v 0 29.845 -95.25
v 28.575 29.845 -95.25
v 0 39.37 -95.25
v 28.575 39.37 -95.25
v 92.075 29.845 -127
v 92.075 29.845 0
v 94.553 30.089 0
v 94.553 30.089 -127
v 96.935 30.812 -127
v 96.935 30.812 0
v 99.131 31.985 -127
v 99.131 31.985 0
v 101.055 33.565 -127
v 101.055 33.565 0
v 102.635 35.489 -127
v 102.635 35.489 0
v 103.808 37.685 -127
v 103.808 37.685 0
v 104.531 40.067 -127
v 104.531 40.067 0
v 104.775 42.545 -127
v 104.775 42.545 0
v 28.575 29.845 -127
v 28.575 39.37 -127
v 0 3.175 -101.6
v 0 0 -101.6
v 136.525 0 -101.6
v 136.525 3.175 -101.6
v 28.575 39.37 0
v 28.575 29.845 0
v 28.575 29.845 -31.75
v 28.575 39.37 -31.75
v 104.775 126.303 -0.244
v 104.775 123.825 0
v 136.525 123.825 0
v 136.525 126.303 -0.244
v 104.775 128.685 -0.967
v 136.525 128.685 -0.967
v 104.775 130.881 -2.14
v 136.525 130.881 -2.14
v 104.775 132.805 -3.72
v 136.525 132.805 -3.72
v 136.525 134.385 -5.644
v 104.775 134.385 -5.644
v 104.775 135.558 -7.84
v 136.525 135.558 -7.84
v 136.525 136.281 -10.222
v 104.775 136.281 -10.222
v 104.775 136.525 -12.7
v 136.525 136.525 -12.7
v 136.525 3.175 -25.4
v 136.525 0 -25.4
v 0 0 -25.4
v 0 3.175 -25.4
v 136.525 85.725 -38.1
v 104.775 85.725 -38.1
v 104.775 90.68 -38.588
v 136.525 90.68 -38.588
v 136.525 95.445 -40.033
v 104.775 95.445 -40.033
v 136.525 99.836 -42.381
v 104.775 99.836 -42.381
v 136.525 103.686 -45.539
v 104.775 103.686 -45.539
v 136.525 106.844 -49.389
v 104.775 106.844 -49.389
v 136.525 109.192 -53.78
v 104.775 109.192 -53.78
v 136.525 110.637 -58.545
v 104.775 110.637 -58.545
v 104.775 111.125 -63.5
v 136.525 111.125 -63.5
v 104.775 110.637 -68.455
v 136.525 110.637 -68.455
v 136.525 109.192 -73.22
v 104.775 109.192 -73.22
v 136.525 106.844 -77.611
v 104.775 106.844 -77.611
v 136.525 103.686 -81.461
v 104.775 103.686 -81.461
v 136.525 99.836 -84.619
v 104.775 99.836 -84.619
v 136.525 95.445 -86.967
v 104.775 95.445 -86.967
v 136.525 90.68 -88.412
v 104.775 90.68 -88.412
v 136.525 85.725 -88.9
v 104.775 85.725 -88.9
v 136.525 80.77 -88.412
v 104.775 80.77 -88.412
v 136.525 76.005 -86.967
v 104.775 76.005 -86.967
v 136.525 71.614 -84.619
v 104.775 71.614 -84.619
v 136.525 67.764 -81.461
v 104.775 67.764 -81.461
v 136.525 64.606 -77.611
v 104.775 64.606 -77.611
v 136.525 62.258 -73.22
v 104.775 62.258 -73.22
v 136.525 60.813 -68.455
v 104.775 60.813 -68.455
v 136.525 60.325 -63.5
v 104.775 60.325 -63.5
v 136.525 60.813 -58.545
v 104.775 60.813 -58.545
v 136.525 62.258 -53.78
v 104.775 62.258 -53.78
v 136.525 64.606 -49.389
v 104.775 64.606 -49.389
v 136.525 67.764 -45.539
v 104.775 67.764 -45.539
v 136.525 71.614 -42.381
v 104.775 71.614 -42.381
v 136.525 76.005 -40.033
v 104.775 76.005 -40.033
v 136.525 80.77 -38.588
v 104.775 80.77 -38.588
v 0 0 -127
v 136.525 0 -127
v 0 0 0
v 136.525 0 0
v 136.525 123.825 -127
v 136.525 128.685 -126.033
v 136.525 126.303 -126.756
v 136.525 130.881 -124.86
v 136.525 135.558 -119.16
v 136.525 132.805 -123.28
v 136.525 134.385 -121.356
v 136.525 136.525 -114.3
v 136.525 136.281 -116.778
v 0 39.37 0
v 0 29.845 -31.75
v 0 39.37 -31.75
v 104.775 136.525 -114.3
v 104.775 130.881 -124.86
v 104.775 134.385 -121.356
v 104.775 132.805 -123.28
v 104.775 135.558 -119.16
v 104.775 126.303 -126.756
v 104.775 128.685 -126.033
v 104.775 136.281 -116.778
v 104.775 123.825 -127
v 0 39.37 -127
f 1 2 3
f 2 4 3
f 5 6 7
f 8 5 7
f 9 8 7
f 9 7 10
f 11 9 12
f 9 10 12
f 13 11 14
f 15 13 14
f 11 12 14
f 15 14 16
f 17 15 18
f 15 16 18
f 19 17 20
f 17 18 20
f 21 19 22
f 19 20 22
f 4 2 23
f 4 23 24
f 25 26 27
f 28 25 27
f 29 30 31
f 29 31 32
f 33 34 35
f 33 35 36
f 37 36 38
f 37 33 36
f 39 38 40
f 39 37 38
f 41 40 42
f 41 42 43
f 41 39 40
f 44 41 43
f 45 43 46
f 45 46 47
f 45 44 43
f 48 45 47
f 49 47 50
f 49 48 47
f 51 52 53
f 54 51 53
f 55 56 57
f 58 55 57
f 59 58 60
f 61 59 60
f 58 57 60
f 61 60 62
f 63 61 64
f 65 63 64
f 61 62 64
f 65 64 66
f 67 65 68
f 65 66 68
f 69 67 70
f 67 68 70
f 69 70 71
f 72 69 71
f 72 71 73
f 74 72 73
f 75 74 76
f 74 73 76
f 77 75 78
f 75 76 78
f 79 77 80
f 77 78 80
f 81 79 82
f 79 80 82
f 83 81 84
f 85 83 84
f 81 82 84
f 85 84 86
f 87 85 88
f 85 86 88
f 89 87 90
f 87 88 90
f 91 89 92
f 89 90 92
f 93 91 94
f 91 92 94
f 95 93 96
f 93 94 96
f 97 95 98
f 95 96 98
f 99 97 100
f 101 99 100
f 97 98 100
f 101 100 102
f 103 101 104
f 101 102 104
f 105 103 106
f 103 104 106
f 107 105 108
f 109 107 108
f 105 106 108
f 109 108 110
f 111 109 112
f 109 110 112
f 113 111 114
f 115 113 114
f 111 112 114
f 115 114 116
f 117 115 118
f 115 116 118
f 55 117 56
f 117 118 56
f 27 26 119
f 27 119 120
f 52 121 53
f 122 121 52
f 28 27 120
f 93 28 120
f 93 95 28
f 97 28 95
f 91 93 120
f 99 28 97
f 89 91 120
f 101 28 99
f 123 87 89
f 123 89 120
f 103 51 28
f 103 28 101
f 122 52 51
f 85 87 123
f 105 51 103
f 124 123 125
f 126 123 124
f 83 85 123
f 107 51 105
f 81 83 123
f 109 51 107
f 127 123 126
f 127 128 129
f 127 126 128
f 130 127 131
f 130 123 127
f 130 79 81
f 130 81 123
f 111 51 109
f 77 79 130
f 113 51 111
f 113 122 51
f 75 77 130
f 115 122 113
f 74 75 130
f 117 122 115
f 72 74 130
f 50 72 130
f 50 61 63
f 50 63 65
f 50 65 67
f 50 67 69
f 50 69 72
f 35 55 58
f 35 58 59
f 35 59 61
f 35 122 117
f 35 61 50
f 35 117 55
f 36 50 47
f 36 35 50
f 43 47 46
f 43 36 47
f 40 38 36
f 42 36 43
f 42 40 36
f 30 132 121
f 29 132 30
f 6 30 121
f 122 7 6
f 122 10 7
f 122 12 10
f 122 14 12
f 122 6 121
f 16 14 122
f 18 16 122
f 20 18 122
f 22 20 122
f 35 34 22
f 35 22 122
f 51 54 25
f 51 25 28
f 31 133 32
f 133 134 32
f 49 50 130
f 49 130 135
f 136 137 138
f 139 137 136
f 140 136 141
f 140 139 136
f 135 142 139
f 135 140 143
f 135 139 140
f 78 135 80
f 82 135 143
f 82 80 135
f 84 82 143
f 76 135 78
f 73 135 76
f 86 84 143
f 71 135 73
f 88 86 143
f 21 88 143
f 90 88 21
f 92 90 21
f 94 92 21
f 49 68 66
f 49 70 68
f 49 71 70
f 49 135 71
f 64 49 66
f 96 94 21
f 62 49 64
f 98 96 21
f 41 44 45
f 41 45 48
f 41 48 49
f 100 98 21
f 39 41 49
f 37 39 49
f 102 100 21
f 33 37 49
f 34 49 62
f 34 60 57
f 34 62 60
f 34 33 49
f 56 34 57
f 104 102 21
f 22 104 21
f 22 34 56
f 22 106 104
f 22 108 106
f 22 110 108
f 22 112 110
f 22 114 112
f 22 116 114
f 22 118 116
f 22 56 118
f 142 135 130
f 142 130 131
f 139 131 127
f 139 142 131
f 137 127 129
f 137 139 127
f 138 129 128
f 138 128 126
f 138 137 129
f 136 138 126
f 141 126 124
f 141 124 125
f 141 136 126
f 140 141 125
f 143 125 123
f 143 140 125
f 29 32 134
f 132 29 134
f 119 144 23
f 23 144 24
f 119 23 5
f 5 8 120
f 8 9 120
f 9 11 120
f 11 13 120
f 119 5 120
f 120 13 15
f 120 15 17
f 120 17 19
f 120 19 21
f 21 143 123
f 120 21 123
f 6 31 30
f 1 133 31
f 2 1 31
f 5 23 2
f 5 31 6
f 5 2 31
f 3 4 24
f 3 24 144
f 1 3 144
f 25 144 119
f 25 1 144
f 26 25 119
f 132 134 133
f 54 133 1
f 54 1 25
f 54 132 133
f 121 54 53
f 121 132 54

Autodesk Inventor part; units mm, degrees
ref_plane "YZ Plane" through (0, 0, 0) normal (1, 0, 0) x (0, 1, 0)
ref_plane "XZ Plane" through (0, 0, 0) normal (0, 1, 0) x (-1, 0, 0)
ref_plane "XY Plane" through (0, 0, 0) normal (0, 0, 1) x (1, 0, 0)
sketch "Sketch1" plane through (0, 0, 0) normal (0, 0, 1) x (1, 0, 0)
  line L0 (0, 0) -> (136.525, 0)
  line L1 (136.525, 0) -> (136.525, 136.525)
  line L2 (136.525, 136.525) -> (104.775, 136.525)
  line L3 (104.775, 136.525) -> (104.775, 42.545)
  line L4 (92.075, 29.845) -> (28.575, 29.845)
  line L5 (28.575, 29.845) -> (28.575, 39.37)
  line L6 (28.575, 39.37) -> (0, 39.37)
  line L7 (0, 39.37) -> (0, 0)
  arc A0 (92.075, 29.845) -> (104.775, 42.545) centre (92.075, 42.545) ccw
  point P0 (104.775, 29.845)
  dimension "d0" = 136.525
  dimension "d1" = 136.525
  dimension "d2" = 31.75
  dimension "d3" = 9.525
  dimension "d4" = 39.37
  dimension "d5" = 76.2
  dimension "d17" = 12.7
extrude "Extrusion1" add sketch "Sketch1" against normal blind 127
sketch "Sketch2" plane through (0, 39.37, 0) normal (0, 1, 0) x (1, 0, 0)
  line L0 (28.575, 0) -> (28.575, 127) projected
  line L1 (28.575, 95.25) -> (0, 95.25)
  line L2 (0, 95.25) -> (0, 31.75)
  line L3 (0, 0) -> (0, 127) projected
  line L4 (0, 31.75) -> (28.575, 31.75)
  line L5 (0, 127) -> (28.575, 127) projected
  dimension "d9" = 63.5
  dimension "d10" = 31.75
extrude "Extrusion2" cut sketch "Sketch2" against normal blind 9.525 contours L4 L2 L1 L0
sketch "Sketch3" plane through (0, 0, 0) normal (0, -1, 0) x (1, 0, 0)
  line L0 (0, 0) -> (0, -127) projected
  line L1 (0, -101.6) -> (136.525, -101.6)
  line L2 (136.525, 0) -> (136.525, -127) projected
  line L3 (136.525, -25.4) -> (0, -25.4)
  line L4 (0, 0) -> (136.525, 0) projected
  dimension "d13" = 76.2
  dimension "d14" = 25.4
extrude "Extrusion3" cut sketch "Sketch3" against normal blind 3.175 contours L3 L2 L1 L0
sketch "Sketch4" plane through (104.775, 29.845, 0) normal (-1, 0, 0) x (0, 0, 1)
  point P0 (0, -29.845)
sketch "Sketch5" plane through (104.775, 42.545, 0) normal (-1, 0, 0) x (0, 0, 1)
  circle A0 centre (-63.5, 43.18) radius 25.4
  line L0 (-127, 0) -> (-127, 93.98) projected
  line L1 (0, 93.98) -> (-127, 93.98) projected
  point P0 (0, -42.545)
  dimension "d18" = 50.8
  dimension "d19" = 63.5
  dimension "d20" = 50.8
extrude "Extrusion4" cut sketch "Sketch5" against normal through all
sketch "Sketch6" plane through (104.775, 42.545, 0) normal (-1, 0, 0) x (0, 0, 1)
  point P0 (0, -42.545)
sketch "Sketch7" plane through (104.775, 42.545, 0) normal (-1, 0, 0) x (0, 0, 1)
  point P0 (0, -42.545)
fillet "Fillet1" radius 12.7 1 edges at (120.65, 136.525, 0)
fillet "Fillet2" radius 12.7 1 edges at (120.65, 136.525, -127)
properties part number "HW 4 Part 2"
